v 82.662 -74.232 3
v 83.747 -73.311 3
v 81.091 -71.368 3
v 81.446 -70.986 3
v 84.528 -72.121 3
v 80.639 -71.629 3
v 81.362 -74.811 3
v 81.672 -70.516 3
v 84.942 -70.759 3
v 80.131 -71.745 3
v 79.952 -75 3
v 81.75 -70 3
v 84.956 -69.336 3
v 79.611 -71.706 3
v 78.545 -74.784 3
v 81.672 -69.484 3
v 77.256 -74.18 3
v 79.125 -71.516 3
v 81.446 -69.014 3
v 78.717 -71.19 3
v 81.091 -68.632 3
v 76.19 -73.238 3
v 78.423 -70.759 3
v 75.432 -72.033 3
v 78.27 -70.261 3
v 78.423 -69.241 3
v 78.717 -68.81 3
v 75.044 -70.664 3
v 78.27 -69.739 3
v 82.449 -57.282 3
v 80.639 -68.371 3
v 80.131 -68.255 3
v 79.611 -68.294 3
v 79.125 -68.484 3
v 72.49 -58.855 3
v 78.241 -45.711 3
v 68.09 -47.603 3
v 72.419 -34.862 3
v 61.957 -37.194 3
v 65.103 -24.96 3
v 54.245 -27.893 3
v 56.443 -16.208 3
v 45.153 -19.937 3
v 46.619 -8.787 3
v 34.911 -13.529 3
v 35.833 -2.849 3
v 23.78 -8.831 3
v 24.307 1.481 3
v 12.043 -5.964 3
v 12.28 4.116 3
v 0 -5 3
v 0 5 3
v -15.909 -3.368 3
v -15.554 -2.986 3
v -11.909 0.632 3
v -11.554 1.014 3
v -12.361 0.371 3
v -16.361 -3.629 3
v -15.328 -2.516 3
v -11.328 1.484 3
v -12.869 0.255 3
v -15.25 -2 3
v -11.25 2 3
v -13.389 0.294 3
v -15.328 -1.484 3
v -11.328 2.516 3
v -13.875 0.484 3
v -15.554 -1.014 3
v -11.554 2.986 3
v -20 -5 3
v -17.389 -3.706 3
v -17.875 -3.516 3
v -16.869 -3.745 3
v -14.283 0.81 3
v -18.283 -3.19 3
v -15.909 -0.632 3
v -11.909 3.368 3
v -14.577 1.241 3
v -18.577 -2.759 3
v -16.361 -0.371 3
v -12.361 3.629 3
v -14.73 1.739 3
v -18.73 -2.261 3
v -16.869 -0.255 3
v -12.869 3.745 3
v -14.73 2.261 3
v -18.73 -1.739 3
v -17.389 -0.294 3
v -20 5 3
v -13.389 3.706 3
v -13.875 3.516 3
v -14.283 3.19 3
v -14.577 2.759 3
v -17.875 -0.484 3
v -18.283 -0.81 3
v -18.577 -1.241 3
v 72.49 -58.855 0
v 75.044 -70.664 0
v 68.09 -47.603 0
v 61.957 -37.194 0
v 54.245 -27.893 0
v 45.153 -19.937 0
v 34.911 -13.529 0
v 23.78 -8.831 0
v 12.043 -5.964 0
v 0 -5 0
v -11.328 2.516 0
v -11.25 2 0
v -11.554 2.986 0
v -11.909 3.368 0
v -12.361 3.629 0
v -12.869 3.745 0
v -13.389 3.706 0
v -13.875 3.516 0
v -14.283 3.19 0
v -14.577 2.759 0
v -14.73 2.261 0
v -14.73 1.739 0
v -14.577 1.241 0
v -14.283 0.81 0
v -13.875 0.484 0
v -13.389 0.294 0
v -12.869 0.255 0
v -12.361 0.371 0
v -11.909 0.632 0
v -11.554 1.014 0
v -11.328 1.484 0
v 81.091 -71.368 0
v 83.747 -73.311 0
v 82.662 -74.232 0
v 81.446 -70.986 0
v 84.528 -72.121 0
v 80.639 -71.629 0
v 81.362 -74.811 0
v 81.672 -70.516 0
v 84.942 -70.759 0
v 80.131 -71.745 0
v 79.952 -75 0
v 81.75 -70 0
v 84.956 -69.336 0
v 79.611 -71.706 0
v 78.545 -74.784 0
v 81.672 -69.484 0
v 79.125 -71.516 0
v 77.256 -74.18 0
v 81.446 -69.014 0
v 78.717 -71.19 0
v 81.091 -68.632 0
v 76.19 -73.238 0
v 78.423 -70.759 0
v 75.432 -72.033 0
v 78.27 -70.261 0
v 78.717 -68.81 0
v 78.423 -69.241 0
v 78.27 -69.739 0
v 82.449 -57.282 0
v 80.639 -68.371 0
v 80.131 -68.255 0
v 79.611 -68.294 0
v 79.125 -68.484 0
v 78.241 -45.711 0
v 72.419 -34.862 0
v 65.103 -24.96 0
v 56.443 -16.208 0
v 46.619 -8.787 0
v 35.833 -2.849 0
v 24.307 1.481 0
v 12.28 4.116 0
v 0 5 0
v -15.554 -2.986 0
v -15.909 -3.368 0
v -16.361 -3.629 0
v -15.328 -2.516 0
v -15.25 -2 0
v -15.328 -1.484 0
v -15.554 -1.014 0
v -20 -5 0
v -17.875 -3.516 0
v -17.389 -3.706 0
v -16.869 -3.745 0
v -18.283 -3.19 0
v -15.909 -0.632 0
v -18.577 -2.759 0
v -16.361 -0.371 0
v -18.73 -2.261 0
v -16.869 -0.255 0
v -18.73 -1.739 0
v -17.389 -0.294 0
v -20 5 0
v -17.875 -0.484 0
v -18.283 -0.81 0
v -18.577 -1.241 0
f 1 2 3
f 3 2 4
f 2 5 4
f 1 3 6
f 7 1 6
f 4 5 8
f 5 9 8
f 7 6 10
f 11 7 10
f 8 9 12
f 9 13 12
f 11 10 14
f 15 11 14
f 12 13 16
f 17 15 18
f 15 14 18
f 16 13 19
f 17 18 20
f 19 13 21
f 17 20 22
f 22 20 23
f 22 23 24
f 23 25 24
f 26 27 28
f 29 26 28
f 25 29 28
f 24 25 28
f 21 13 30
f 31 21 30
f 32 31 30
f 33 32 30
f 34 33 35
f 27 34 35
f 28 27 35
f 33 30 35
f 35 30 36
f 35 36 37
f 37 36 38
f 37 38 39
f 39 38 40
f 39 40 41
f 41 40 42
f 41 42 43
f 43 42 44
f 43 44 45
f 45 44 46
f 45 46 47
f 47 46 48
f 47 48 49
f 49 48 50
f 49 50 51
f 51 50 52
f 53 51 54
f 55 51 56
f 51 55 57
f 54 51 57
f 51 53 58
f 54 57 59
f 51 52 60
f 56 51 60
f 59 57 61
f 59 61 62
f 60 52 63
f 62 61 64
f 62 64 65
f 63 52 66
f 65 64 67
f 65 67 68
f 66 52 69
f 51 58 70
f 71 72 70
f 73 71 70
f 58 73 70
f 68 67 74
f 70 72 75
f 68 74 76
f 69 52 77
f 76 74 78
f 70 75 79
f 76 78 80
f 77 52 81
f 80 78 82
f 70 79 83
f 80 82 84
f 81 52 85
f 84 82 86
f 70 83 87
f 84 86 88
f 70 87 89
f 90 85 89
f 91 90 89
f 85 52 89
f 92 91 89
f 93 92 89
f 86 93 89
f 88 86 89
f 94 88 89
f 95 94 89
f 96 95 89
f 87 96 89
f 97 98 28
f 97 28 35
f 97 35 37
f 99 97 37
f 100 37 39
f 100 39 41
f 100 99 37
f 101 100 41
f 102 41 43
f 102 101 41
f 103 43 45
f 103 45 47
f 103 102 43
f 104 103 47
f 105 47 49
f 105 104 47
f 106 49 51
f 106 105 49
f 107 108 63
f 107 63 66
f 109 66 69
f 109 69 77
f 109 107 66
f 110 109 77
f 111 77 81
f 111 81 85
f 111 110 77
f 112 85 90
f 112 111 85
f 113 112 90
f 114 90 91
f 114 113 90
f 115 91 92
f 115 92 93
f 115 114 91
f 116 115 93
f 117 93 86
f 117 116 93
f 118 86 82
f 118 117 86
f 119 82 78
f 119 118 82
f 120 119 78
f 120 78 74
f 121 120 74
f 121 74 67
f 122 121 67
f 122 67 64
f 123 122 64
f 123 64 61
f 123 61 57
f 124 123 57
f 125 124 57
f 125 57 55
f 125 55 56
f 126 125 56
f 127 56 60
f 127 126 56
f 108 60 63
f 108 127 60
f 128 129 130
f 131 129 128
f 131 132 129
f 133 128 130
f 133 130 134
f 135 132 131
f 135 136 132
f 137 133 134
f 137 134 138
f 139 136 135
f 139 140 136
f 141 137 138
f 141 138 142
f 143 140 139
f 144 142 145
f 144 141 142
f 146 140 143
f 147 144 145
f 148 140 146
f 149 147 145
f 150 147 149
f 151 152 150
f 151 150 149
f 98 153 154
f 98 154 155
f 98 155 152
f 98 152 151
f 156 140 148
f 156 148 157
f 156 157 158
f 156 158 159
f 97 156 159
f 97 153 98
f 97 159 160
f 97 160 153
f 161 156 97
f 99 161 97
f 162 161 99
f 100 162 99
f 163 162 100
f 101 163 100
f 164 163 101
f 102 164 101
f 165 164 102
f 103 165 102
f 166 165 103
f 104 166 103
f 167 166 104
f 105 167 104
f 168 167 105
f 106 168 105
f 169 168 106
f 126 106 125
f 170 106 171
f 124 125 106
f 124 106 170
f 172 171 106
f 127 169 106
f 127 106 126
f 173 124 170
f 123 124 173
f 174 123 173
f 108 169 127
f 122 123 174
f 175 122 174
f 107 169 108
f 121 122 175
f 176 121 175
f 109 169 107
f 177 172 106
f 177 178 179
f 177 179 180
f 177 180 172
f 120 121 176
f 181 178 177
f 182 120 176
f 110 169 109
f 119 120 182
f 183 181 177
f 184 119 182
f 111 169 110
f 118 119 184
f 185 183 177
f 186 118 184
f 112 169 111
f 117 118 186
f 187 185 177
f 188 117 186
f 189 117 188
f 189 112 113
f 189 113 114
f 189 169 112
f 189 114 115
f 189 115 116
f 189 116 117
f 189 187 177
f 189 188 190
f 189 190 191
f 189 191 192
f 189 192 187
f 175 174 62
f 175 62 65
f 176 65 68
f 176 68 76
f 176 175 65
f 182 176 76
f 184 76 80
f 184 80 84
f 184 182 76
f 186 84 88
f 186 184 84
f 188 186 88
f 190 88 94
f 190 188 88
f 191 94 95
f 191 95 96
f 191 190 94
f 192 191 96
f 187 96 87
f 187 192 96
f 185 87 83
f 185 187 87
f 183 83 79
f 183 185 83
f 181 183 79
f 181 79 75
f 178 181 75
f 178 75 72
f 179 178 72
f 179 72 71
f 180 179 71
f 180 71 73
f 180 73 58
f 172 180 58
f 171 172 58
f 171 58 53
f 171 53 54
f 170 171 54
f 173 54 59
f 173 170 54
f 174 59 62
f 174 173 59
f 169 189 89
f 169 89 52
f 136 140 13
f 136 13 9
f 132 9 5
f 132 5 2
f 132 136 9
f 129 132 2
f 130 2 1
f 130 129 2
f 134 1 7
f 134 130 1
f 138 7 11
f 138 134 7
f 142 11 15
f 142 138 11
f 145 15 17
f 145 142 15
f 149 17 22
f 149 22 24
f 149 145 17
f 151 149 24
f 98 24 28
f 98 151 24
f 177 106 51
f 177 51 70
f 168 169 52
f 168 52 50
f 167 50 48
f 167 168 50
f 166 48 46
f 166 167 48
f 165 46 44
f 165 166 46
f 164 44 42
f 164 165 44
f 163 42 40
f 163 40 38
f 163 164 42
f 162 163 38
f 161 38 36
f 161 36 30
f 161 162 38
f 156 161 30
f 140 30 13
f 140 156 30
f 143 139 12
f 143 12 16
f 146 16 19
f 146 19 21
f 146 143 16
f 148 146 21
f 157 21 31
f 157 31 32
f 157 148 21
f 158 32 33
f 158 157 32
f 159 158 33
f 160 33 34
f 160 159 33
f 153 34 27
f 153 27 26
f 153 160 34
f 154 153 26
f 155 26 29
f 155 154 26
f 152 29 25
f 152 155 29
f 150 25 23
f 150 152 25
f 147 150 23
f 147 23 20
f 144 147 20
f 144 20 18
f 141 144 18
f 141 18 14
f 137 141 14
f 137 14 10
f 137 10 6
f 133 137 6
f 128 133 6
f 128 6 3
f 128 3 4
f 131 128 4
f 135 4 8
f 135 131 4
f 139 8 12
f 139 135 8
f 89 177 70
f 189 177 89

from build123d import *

# Parameters (mm, degrees)
ESBO_O1_R                = 1.75
RESSALTO_EXTRUS_O1_DEPTH = 3


with BuildPart() as part:
    # Esboço1 → Ressalto-extrusão1 (new body)
    # profile 1 of 3: a face of its own
    with BuildSketch(Plane.XY):
        with BuildLine():
            ThreePointArc((0, 5), (-5, 0), (0, -5))
            Line((0, -5), (-20, -5))
            Line((-20, -5), (-20, 5))
            Line((-20, 5), (0, 5))
        make_face()
        with Locations((-17, -2)):
            Circle(ESBO_O1_R, mode=Mode.SUBTRACT)
        with Locations((-13, 2)):
            Circle(ESBO_O1_R, mode=Mode.SUBTRACT)
    # profile 2 of 3: a face of its own
    with BuildSketch(Plane.XY):
        with BuildLine():
            ThreePointArc((75.044247788, -70.663716814), (49.858206024, -23.733478829), (0, -5))
            Line((0, -5), (0, 5))
            ThreePointArc((0, 5), (56.443252103, -16.207711882), (84.955752212, -69.336283186))
            ThreePointArc((84.955752212, -69.336283186), (80.663716814, -74.955752212), (75.044247788, -70.663716814))
        make_face()
        with Locations((80, -70)):
            Circle(ESBO_O1_R, mode=Mode.SUBTRACT)
    # profile 3 of 3: a face of its own
    with BuildSketch(Plane.XY):
        with BuildLine():
            Line((0, 5), (0, -5))
            ThreePointArc((0, -5), (-5, 0), (0, 5))
        make_face()
    extrude(amount=RESSALTO_EXTRUS_O1_DEPTH)


solid = part.part
